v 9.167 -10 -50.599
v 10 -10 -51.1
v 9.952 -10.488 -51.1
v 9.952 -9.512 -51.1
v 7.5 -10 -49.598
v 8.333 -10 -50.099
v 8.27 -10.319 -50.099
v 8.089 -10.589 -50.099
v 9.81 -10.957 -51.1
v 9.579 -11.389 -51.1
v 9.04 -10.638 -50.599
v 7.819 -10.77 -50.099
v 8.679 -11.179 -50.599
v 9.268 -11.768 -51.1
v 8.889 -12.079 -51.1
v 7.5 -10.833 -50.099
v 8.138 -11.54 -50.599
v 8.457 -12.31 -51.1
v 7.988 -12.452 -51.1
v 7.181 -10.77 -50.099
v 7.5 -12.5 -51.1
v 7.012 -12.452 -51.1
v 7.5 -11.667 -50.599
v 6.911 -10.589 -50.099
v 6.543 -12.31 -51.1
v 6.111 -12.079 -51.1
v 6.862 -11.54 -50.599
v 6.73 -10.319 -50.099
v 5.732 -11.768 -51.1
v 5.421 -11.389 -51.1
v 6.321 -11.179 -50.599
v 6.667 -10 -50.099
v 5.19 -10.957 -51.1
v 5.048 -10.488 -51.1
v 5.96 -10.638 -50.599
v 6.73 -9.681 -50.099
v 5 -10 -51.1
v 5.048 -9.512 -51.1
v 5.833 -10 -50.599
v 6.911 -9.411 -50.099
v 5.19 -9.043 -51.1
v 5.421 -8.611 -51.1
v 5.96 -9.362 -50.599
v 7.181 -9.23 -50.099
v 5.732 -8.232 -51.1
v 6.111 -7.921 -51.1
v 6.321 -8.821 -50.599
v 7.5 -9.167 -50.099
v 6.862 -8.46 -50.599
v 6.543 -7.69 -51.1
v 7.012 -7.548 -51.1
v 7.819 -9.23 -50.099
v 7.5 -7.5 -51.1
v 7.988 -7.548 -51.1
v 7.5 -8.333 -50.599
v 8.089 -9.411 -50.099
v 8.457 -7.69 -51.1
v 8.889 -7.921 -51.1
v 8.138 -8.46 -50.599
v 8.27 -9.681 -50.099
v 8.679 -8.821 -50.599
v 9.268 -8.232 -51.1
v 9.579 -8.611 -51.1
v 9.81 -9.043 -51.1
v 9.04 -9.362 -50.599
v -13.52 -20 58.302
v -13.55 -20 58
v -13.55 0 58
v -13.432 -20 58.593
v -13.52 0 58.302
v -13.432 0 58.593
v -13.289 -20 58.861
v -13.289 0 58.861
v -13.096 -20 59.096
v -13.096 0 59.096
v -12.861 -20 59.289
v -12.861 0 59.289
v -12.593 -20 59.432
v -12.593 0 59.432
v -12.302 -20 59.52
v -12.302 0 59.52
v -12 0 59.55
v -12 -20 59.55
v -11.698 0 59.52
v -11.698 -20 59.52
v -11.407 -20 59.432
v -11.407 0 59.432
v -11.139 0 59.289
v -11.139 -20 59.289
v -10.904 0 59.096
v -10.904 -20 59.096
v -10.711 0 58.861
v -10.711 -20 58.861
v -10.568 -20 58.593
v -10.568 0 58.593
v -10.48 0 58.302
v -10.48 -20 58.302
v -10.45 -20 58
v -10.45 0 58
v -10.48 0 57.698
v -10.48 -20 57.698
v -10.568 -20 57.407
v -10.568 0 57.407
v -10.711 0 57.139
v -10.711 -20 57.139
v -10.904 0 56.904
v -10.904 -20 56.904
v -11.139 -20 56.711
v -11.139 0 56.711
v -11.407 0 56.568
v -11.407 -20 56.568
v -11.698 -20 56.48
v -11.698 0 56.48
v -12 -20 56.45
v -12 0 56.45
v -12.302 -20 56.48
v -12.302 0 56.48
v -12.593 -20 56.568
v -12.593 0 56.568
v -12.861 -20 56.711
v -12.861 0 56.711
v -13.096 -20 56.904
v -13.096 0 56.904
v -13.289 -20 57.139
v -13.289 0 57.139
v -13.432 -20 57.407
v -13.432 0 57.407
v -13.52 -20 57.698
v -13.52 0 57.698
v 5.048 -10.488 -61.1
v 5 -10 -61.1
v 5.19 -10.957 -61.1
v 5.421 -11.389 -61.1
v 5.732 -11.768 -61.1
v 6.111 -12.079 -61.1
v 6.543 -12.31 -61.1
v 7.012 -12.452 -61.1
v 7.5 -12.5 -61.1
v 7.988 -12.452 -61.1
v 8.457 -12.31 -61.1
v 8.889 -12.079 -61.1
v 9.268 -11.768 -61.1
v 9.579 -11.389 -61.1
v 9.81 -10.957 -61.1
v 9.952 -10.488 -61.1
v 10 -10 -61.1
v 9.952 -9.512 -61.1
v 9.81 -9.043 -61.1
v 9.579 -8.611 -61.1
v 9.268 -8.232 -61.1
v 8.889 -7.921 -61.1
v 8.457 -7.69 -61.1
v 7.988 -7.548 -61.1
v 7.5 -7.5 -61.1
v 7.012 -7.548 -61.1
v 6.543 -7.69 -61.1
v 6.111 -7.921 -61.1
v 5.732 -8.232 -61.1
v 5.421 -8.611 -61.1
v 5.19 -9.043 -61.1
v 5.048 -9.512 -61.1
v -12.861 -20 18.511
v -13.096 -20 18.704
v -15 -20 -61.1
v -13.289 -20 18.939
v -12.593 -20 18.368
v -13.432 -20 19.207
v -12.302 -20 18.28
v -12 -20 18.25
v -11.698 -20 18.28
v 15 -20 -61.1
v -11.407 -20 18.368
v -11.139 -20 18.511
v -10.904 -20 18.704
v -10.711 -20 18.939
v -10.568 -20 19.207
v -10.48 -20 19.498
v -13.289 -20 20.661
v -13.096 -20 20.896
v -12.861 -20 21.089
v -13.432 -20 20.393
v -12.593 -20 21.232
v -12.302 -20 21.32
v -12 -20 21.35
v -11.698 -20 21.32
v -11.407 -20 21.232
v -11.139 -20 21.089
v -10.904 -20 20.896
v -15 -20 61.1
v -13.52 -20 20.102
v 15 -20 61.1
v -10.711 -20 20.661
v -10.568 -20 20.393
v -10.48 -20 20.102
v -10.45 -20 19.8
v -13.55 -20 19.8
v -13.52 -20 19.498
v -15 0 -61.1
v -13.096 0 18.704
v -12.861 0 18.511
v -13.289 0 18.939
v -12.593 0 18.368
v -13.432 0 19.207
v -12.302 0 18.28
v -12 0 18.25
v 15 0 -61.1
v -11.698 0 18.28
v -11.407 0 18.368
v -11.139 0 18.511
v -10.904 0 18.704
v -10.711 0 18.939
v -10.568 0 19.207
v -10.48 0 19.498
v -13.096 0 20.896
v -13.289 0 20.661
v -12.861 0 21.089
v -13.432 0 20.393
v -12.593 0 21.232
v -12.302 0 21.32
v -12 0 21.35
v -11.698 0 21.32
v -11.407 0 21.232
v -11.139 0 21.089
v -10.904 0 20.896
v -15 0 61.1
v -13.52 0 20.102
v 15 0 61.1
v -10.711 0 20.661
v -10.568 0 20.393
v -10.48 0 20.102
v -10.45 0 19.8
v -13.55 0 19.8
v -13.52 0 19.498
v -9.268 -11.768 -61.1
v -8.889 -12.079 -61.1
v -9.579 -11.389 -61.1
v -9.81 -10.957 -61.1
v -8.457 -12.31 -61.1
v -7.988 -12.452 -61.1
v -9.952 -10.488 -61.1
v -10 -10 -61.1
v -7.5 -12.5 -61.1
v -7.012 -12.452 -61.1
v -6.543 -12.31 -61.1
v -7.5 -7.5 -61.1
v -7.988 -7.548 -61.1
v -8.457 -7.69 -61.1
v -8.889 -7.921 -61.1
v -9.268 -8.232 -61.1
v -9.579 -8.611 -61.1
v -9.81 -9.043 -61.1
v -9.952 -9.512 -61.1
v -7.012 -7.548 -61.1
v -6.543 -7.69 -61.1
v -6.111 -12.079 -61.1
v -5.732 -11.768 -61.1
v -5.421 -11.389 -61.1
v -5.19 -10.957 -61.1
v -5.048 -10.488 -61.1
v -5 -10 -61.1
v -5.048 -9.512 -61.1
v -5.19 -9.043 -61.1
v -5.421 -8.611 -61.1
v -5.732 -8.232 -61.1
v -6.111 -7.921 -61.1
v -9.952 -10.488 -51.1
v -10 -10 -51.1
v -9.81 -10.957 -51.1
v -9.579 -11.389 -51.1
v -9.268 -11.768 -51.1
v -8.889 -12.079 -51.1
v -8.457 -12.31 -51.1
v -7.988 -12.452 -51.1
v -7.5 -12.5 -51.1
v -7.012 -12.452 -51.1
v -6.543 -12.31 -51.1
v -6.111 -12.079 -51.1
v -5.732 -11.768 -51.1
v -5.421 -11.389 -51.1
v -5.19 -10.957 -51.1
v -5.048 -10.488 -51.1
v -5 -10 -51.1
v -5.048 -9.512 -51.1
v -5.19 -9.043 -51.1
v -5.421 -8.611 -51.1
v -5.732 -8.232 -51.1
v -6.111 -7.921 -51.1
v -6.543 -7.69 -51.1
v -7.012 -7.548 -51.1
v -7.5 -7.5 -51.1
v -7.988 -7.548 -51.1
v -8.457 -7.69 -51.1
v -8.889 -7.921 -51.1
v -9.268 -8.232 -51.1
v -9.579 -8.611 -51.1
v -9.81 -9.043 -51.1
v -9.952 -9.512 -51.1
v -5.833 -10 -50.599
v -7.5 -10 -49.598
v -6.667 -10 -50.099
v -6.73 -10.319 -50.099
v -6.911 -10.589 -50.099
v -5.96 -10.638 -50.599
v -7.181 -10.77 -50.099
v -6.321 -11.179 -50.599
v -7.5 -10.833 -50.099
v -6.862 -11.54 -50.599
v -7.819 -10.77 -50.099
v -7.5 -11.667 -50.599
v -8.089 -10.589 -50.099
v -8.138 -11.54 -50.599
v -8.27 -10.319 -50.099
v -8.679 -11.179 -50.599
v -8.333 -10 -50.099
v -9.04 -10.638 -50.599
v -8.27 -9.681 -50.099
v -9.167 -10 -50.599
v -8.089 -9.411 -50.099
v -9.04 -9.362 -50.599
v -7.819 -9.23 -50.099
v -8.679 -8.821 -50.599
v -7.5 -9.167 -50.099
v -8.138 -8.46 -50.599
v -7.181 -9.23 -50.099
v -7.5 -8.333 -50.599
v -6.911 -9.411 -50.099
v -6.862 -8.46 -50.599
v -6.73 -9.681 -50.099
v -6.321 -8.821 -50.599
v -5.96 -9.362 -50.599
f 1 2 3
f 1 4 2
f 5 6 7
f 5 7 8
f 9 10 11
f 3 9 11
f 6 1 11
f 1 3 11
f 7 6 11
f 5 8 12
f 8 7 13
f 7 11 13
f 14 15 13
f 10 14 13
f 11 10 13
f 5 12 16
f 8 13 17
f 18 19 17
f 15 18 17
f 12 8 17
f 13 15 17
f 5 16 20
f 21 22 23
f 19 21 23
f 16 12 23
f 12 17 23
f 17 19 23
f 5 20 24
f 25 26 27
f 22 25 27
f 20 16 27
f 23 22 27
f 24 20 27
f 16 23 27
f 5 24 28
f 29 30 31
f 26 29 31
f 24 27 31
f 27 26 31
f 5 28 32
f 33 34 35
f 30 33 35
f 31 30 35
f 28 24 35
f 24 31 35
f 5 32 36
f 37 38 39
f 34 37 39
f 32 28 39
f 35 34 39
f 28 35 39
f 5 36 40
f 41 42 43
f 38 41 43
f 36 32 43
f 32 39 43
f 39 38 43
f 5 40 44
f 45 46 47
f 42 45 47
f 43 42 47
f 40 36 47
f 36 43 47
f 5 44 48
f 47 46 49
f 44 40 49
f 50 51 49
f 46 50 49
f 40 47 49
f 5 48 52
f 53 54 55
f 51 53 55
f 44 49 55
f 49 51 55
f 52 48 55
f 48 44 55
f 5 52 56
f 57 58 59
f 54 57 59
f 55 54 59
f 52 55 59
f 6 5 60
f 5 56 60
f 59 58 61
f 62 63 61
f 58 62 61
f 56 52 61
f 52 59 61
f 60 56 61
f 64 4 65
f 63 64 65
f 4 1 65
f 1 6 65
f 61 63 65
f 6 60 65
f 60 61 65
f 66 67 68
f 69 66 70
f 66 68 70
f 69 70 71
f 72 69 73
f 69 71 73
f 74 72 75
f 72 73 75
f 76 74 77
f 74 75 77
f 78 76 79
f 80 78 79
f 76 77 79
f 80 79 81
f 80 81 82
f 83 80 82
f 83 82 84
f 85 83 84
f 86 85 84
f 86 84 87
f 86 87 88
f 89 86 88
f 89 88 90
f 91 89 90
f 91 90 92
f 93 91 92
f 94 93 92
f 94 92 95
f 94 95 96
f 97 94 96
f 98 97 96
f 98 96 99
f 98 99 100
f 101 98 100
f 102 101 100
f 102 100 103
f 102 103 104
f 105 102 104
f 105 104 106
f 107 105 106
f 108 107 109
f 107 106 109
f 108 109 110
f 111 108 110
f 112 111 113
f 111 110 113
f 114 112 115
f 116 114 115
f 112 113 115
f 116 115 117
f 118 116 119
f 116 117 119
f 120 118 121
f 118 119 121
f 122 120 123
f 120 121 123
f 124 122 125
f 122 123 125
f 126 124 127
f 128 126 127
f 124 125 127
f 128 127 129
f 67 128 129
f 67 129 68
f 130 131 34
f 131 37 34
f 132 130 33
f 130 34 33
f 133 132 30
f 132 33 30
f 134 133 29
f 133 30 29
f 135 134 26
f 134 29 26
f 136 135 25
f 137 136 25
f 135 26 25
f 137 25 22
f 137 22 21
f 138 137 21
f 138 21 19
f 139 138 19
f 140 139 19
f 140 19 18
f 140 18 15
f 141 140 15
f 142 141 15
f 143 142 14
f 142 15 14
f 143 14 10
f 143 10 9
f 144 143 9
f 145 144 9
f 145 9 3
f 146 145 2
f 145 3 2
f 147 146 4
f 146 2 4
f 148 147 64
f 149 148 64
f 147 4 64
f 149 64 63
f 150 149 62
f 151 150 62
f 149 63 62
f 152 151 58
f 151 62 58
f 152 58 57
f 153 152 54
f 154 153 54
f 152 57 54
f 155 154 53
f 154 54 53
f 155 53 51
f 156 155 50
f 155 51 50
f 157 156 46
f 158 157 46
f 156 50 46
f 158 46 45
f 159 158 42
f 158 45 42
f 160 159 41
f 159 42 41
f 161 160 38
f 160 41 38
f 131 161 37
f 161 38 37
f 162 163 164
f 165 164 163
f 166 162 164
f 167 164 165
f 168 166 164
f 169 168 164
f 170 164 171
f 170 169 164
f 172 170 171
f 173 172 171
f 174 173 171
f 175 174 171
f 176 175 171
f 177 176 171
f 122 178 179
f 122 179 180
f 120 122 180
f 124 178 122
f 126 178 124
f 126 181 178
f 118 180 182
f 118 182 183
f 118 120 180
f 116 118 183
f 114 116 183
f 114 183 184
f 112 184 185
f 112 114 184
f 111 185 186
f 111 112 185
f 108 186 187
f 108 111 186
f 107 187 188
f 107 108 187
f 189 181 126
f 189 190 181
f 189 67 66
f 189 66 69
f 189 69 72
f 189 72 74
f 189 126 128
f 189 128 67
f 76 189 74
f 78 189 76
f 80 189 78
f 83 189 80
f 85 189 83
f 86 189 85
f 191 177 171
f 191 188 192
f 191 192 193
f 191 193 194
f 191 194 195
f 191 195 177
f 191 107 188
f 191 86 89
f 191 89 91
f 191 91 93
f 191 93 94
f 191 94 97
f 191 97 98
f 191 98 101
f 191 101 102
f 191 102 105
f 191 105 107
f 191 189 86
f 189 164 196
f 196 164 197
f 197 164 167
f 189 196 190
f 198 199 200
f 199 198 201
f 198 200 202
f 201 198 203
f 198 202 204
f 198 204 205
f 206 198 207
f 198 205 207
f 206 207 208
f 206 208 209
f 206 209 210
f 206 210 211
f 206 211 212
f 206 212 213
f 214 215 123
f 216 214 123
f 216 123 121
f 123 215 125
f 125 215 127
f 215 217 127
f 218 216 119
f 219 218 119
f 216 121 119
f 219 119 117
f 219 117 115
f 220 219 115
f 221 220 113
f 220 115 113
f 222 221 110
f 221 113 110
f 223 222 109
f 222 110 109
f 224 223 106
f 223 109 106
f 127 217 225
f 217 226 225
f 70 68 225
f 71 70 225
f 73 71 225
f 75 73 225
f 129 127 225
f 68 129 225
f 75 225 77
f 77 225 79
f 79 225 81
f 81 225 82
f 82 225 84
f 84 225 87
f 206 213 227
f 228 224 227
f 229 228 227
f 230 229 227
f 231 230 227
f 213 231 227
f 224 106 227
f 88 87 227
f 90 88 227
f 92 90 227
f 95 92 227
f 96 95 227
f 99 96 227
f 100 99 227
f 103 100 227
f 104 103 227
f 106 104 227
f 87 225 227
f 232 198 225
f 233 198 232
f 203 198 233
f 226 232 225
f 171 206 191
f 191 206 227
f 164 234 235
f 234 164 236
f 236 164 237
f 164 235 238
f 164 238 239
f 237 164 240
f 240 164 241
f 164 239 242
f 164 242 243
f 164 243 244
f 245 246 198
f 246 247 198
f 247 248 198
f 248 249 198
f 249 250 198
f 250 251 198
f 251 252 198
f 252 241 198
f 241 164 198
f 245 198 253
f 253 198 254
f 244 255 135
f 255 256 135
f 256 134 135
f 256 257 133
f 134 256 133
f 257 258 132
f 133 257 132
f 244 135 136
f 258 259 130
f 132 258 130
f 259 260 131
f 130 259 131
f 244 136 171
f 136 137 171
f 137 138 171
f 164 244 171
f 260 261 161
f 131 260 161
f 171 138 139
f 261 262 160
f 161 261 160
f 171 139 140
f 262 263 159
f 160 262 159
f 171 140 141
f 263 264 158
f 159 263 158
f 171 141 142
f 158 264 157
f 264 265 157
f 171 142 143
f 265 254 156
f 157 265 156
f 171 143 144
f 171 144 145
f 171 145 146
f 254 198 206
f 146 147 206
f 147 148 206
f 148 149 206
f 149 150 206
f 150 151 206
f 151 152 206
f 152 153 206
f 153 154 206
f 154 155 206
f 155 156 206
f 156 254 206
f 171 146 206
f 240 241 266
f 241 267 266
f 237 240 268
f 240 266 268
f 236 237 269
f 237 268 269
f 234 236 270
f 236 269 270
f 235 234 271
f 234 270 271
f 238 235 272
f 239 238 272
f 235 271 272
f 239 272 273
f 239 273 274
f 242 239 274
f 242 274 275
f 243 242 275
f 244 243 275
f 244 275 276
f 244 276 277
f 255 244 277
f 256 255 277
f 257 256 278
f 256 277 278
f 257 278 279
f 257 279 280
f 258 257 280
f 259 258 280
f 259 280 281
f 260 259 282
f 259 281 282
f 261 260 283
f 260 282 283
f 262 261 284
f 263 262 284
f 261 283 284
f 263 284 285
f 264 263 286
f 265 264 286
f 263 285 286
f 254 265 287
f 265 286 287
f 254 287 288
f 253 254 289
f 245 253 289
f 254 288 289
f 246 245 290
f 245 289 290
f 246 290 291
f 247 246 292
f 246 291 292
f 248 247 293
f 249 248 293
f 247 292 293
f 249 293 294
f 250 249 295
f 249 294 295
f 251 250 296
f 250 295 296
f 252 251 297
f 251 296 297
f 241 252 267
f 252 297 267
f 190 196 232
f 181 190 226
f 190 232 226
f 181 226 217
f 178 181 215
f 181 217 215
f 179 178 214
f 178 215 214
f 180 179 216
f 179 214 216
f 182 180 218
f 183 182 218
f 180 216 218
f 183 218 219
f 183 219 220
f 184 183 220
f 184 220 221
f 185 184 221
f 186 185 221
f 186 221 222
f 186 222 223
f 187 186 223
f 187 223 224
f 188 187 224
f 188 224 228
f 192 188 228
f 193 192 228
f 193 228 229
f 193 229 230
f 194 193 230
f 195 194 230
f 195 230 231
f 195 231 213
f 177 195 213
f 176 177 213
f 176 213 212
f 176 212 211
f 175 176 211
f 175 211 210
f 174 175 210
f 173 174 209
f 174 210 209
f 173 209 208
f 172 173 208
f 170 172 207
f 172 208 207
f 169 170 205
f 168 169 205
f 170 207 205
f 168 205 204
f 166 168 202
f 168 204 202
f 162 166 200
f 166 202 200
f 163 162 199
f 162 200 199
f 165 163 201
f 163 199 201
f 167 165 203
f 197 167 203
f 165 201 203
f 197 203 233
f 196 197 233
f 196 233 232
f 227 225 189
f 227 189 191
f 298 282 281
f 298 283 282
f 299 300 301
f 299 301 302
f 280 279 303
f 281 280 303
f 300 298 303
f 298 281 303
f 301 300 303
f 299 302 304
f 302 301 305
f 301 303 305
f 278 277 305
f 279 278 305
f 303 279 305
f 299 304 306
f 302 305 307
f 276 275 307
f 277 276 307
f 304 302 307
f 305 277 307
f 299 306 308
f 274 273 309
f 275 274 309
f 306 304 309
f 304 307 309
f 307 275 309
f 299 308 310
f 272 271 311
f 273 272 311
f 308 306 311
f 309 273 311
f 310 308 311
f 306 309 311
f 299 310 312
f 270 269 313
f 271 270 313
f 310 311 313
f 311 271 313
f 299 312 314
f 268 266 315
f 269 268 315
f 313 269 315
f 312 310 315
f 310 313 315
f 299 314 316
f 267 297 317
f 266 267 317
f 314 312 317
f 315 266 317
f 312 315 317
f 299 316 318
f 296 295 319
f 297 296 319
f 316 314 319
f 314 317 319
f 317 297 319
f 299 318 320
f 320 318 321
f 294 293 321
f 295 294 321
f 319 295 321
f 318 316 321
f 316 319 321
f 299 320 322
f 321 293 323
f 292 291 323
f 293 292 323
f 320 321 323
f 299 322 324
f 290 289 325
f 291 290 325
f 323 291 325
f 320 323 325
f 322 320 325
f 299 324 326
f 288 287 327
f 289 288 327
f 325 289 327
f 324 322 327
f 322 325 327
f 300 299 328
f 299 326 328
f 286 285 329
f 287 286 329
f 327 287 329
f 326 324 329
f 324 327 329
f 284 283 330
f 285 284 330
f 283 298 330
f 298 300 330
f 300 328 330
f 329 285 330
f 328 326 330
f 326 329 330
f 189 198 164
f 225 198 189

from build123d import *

# Parameters (mm, degrees)
F0_W     = 30
F0_H     = 122.2
F1_DEPTH = 20
F3_D     = 3.1
F5_D     = 5
F5_DEPTH = 10
F5_TIP   = 1.5021515476


with BuildPart() as f1:
    # F0 (on Front) → F1 (new body)
    with BuildSketch(Plane.XZ):
        Rectangle(F0_W, F0_H)
    extrude(amount=F1_DEPTH)

    # F3 (through all)
    with Locations(Plane.XZ.offset(20)):
        with Locations((-12, 58), (-12, 19.8)):
            Hole(F3_D / 2)

    # F5
    with Locations(Plane(origin=(0, 0, -61.1), x_dir=(1, 0, 0), z_dir=(0, 0, -1))):
        with Locations((-7.5, 10), (7.5, 10)):
            Hole(F5_D / 2, depth=F5_DEPTH)
            with Locations((0, 0, -(F5_DEPTH + F5_TIP / 2))):  # 118° drill point
                Cone(0, F5_D / 2, F5_TIP, mode=Mode.SUBTRACT)


solid = f1.part
